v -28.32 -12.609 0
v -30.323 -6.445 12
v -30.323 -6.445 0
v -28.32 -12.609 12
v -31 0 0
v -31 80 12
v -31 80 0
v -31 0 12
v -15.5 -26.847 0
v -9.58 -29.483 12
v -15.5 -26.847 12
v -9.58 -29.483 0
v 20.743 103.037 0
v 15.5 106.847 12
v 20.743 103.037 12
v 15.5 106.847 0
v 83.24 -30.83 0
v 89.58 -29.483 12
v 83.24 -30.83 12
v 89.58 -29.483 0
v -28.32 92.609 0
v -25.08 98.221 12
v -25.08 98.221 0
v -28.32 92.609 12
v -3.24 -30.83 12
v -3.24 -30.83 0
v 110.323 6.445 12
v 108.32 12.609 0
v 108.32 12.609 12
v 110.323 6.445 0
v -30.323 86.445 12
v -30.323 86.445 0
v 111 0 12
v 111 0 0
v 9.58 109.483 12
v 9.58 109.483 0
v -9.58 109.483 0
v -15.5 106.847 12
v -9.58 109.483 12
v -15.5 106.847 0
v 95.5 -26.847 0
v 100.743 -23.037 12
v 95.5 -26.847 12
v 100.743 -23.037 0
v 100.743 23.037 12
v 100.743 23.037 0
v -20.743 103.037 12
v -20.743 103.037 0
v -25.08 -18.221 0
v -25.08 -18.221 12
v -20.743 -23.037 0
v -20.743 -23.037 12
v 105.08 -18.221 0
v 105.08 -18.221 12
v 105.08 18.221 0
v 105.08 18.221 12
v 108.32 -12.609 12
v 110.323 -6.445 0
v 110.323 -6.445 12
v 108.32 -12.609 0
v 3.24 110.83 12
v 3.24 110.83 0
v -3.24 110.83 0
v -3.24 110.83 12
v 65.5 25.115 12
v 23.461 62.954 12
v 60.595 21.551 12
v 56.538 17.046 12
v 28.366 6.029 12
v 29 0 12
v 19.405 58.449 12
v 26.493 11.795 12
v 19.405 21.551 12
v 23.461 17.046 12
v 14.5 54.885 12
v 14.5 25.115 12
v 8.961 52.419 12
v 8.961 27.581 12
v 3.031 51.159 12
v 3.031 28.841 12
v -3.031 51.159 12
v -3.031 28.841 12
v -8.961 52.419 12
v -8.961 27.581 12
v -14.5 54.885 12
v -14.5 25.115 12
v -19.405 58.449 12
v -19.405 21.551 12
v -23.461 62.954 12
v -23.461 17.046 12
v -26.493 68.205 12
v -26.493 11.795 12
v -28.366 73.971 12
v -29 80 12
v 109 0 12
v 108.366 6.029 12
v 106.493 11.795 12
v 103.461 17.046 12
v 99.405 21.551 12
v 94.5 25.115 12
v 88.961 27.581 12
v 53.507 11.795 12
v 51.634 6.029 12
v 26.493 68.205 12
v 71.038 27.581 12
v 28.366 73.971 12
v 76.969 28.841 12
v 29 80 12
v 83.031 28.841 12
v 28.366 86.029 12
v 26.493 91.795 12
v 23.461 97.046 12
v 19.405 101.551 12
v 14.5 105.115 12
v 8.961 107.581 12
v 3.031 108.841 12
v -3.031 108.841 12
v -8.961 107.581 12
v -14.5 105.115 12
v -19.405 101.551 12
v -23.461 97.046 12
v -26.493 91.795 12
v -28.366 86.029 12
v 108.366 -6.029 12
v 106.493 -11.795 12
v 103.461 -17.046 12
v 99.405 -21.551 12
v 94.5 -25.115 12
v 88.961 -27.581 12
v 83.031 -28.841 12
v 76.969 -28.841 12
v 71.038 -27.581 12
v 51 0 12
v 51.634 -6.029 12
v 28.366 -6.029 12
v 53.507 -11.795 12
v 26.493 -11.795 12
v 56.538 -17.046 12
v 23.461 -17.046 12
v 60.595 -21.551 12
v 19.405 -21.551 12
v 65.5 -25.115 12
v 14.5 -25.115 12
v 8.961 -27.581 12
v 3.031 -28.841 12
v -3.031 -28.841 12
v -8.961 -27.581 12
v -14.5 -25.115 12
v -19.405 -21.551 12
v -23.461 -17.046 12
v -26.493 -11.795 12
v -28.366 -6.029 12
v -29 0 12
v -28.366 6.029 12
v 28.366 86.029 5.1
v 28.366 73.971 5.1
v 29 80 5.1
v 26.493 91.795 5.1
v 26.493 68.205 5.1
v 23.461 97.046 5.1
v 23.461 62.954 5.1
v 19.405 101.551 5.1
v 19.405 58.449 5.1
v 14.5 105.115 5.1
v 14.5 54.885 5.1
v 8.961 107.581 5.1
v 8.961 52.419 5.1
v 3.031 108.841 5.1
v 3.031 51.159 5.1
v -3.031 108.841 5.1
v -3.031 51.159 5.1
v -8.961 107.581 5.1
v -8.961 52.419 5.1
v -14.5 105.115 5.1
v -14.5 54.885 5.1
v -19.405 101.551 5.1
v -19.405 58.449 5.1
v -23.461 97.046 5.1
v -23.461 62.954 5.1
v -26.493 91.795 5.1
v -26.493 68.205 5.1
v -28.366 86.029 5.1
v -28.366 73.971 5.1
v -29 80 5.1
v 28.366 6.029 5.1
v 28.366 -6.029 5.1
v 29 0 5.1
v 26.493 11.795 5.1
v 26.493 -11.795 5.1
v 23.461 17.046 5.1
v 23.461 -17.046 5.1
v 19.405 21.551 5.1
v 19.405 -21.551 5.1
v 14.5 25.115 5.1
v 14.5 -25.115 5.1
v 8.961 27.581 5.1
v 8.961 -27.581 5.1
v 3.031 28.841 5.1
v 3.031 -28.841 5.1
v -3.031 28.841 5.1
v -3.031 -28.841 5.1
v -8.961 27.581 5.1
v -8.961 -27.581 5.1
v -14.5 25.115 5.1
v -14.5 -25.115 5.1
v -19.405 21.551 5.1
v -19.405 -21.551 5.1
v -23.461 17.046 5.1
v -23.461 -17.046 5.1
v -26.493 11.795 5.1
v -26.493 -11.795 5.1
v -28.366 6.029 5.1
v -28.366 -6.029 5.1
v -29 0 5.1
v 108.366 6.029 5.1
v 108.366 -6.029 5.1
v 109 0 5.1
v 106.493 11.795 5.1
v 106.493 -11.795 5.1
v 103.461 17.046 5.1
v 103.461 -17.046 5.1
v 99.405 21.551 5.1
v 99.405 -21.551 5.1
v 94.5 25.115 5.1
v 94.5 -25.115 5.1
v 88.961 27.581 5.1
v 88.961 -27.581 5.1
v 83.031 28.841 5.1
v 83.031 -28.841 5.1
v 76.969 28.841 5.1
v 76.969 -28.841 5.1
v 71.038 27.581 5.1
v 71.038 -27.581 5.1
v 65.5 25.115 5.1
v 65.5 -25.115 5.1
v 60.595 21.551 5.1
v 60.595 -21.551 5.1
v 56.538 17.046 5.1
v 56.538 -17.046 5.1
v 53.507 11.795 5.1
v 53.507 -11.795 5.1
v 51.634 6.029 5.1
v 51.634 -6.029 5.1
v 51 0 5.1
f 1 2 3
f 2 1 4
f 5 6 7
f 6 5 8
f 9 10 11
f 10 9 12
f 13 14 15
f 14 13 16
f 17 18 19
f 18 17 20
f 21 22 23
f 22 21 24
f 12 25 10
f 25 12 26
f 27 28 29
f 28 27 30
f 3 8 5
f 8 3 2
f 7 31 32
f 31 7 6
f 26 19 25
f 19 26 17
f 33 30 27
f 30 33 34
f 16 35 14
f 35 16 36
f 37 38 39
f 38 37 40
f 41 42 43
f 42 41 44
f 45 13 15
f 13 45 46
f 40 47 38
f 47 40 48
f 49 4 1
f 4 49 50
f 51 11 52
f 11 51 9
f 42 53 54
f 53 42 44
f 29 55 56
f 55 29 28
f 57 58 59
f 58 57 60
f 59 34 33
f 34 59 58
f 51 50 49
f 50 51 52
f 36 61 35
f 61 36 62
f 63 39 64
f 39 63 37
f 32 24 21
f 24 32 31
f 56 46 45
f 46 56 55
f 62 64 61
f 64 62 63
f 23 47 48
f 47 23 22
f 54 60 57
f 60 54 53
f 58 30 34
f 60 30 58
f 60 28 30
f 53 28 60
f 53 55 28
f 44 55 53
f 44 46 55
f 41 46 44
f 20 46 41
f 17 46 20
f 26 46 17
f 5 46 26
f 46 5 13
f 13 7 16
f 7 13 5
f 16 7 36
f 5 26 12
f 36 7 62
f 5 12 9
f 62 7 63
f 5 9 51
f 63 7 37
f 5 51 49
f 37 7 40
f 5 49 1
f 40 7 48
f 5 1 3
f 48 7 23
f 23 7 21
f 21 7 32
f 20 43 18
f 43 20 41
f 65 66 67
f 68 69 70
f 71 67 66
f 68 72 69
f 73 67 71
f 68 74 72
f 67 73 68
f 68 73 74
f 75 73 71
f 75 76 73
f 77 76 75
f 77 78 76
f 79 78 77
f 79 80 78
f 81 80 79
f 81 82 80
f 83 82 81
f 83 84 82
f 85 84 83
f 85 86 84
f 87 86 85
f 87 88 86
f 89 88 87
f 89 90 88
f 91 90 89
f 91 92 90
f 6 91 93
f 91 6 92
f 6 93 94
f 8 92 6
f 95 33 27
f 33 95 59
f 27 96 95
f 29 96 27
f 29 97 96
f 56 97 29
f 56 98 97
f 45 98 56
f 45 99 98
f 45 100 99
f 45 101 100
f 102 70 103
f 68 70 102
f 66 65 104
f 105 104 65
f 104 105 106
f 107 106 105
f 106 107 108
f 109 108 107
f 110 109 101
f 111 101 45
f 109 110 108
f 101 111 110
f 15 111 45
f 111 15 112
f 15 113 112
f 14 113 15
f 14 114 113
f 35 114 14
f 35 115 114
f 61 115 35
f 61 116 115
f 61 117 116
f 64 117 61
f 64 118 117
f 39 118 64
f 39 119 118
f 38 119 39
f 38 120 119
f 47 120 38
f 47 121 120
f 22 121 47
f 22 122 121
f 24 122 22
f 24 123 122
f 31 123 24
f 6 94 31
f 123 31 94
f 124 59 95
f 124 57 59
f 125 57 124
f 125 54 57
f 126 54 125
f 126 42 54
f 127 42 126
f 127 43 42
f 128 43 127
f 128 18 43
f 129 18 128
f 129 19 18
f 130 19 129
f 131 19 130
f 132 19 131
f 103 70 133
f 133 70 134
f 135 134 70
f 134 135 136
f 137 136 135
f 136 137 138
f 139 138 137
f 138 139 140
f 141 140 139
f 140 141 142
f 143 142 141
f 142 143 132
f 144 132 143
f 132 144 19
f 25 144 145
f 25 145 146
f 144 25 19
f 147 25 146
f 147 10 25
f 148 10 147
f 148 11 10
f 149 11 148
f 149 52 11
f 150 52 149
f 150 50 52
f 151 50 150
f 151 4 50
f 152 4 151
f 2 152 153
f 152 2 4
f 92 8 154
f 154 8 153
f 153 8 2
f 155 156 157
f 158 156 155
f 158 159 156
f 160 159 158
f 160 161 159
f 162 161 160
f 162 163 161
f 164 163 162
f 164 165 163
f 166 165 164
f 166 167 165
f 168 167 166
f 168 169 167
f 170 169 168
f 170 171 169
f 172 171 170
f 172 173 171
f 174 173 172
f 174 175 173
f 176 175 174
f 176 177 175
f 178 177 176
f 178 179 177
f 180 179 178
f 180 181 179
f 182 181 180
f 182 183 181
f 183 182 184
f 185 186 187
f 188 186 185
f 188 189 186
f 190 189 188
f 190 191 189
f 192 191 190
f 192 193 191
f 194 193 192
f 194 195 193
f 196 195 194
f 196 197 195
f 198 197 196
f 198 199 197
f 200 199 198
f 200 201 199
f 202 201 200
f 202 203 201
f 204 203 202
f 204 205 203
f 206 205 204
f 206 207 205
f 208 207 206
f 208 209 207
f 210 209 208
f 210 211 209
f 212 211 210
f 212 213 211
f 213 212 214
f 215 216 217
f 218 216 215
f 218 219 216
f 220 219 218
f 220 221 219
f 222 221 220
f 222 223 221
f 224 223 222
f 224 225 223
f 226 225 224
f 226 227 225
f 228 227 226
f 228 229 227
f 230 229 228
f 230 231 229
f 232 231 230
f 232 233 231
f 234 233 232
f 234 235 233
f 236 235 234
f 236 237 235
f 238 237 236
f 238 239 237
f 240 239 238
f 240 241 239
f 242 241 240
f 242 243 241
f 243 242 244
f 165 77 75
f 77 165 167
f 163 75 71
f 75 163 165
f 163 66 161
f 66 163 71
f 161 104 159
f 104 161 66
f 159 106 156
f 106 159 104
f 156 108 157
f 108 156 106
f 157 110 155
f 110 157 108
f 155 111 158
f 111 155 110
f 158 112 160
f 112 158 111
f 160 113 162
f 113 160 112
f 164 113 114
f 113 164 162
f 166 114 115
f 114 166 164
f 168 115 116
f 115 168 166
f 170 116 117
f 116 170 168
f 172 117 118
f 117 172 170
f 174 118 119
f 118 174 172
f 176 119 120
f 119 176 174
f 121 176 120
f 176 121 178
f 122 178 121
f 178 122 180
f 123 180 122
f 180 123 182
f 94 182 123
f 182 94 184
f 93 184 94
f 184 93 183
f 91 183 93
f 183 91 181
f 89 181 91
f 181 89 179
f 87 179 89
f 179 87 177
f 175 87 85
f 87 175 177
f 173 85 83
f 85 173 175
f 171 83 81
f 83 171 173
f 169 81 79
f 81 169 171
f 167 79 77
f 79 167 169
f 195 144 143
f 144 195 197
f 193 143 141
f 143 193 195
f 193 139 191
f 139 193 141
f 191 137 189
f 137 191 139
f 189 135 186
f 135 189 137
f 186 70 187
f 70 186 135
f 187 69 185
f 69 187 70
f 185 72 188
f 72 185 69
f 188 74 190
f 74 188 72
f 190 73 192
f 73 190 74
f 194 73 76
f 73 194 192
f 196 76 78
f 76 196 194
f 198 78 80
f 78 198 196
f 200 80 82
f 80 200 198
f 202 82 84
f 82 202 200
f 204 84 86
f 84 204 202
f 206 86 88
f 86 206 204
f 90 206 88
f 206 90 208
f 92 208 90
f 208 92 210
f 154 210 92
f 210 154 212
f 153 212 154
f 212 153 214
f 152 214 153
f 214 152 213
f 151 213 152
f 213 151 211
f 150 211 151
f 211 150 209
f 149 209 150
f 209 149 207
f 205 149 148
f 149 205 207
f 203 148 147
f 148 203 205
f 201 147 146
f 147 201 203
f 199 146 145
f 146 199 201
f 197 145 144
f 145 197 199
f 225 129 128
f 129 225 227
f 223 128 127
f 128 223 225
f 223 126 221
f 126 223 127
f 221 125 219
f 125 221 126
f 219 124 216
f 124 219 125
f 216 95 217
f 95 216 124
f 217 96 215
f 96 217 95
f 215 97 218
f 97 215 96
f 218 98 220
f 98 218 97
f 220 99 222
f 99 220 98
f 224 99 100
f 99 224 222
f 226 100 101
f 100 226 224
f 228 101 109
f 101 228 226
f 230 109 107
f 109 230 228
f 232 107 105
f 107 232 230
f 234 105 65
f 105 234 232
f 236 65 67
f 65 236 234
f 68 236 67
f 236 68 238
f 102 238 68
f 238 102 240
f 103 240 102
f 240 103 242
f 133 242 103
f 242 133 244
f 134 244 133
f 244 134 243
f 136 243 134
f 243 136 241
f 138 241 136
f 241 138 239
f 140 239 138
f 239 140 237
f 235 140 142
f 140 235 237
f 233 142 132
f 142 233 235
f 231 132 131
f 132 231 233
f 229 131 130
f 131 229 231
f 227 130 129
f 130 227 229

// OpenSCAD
piezo_diam = 28;
margin = 1;
piezo_shell = 2;
drum_depth = 7;
bottom_thickness = 5;
epsilon = 0.1;
drumPositions = [[0, 0], [80, 0], [0, 80]];



module holes() {
  for (d = drumPositions) {
    translate(d) {
      circle(piezo_diam + margin);
    }
  };
}

module shell() {
  for (d = drumPositions) {
    translate(d) {
      circle(piezo_diam + margin + piezo_shell);
    }
  };
}


difference() {
  linear_extrude(drum_depth + bottom_thickness) {
    hull() {
      shell();
    };
  };
  translate([0, 0, bottom_thickness + epsilon]) {
    linear_extrude(drum_depth) {
      holes();
    };
  };
}
